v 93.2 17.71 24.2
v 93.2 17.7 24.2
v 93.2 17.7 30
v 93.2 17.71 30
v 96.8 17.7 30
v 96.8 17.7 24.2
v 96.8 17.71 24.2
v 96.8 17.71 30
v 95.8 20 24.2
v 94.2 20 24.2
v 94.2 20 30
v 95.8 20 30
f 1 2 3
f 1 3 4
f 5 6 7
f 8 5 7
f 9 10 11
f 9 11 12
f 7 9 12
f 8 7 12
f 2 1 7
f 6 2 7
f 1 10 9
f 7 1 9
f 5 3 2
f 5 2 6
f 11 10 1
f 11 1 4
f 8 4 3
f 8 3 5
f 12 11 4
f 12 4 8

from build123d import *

# Parameters (mm, degrees)
BOX036_W           = 3.6
BOX036_H           = 2.3
BOX036_DEPTH       = 5.8
CHAMFER031_1_SIZE2 = 1
CHAMFER031_1_SIZE  = 2.29
CHAMFER031_2_SIZE2 = 1
CHAMFER031_2_SIZE  = 2.29


with BuildPart() as part:
    # Box036 → Box036 (new body)
    with BuildSketch(Plane(origin=(53.2, 17.7, 24.2), x_dir=(1, 0, 0), z_dir=(0, 0, 1))):
        with Locations((1.8, 1.15)):
            Rectangle(BOX036_W, BOX036_H)
    extrude(amount=BOX036_DEPTH)

    # Chamfer031 1
    chamfer031_1_edges = [part.edges().sort_by_distance(p)[0] for p in [
        (56.8, 20, 27.1),
    ]]
    chamfer031_1_side = part.faces().sort_by_distance((56.8, 18.85, 27.1))[0]
    chamfer(chamfer031_1_edges, length=CHAMFER031_1_SIZE, length2=CHAMFER031_1_SIZE2, reference=chamfer031_1_side)

    # Chamfer031 2
    chamfer031_2_edges = [part.edges().sort_by_distance(p)[0] for p in [
        (53.2, 20, 27.1),
    ]]
    chamfer031_2_side = part.faces().sort_by_distance((53.2, 18.85, 27.1))[0]
    chamfer(chamfer031_2_edges, length=CHAMFER031_2_SIZE, length2=CHAMFER031_2_SIZE2, reference=chamfer031_2_side)


with BuildPart() as part_1:
    # Chamfer031 placement: moved
    add(part.part.moved(Location((40, 0, 0))))


solid = part_1.part
